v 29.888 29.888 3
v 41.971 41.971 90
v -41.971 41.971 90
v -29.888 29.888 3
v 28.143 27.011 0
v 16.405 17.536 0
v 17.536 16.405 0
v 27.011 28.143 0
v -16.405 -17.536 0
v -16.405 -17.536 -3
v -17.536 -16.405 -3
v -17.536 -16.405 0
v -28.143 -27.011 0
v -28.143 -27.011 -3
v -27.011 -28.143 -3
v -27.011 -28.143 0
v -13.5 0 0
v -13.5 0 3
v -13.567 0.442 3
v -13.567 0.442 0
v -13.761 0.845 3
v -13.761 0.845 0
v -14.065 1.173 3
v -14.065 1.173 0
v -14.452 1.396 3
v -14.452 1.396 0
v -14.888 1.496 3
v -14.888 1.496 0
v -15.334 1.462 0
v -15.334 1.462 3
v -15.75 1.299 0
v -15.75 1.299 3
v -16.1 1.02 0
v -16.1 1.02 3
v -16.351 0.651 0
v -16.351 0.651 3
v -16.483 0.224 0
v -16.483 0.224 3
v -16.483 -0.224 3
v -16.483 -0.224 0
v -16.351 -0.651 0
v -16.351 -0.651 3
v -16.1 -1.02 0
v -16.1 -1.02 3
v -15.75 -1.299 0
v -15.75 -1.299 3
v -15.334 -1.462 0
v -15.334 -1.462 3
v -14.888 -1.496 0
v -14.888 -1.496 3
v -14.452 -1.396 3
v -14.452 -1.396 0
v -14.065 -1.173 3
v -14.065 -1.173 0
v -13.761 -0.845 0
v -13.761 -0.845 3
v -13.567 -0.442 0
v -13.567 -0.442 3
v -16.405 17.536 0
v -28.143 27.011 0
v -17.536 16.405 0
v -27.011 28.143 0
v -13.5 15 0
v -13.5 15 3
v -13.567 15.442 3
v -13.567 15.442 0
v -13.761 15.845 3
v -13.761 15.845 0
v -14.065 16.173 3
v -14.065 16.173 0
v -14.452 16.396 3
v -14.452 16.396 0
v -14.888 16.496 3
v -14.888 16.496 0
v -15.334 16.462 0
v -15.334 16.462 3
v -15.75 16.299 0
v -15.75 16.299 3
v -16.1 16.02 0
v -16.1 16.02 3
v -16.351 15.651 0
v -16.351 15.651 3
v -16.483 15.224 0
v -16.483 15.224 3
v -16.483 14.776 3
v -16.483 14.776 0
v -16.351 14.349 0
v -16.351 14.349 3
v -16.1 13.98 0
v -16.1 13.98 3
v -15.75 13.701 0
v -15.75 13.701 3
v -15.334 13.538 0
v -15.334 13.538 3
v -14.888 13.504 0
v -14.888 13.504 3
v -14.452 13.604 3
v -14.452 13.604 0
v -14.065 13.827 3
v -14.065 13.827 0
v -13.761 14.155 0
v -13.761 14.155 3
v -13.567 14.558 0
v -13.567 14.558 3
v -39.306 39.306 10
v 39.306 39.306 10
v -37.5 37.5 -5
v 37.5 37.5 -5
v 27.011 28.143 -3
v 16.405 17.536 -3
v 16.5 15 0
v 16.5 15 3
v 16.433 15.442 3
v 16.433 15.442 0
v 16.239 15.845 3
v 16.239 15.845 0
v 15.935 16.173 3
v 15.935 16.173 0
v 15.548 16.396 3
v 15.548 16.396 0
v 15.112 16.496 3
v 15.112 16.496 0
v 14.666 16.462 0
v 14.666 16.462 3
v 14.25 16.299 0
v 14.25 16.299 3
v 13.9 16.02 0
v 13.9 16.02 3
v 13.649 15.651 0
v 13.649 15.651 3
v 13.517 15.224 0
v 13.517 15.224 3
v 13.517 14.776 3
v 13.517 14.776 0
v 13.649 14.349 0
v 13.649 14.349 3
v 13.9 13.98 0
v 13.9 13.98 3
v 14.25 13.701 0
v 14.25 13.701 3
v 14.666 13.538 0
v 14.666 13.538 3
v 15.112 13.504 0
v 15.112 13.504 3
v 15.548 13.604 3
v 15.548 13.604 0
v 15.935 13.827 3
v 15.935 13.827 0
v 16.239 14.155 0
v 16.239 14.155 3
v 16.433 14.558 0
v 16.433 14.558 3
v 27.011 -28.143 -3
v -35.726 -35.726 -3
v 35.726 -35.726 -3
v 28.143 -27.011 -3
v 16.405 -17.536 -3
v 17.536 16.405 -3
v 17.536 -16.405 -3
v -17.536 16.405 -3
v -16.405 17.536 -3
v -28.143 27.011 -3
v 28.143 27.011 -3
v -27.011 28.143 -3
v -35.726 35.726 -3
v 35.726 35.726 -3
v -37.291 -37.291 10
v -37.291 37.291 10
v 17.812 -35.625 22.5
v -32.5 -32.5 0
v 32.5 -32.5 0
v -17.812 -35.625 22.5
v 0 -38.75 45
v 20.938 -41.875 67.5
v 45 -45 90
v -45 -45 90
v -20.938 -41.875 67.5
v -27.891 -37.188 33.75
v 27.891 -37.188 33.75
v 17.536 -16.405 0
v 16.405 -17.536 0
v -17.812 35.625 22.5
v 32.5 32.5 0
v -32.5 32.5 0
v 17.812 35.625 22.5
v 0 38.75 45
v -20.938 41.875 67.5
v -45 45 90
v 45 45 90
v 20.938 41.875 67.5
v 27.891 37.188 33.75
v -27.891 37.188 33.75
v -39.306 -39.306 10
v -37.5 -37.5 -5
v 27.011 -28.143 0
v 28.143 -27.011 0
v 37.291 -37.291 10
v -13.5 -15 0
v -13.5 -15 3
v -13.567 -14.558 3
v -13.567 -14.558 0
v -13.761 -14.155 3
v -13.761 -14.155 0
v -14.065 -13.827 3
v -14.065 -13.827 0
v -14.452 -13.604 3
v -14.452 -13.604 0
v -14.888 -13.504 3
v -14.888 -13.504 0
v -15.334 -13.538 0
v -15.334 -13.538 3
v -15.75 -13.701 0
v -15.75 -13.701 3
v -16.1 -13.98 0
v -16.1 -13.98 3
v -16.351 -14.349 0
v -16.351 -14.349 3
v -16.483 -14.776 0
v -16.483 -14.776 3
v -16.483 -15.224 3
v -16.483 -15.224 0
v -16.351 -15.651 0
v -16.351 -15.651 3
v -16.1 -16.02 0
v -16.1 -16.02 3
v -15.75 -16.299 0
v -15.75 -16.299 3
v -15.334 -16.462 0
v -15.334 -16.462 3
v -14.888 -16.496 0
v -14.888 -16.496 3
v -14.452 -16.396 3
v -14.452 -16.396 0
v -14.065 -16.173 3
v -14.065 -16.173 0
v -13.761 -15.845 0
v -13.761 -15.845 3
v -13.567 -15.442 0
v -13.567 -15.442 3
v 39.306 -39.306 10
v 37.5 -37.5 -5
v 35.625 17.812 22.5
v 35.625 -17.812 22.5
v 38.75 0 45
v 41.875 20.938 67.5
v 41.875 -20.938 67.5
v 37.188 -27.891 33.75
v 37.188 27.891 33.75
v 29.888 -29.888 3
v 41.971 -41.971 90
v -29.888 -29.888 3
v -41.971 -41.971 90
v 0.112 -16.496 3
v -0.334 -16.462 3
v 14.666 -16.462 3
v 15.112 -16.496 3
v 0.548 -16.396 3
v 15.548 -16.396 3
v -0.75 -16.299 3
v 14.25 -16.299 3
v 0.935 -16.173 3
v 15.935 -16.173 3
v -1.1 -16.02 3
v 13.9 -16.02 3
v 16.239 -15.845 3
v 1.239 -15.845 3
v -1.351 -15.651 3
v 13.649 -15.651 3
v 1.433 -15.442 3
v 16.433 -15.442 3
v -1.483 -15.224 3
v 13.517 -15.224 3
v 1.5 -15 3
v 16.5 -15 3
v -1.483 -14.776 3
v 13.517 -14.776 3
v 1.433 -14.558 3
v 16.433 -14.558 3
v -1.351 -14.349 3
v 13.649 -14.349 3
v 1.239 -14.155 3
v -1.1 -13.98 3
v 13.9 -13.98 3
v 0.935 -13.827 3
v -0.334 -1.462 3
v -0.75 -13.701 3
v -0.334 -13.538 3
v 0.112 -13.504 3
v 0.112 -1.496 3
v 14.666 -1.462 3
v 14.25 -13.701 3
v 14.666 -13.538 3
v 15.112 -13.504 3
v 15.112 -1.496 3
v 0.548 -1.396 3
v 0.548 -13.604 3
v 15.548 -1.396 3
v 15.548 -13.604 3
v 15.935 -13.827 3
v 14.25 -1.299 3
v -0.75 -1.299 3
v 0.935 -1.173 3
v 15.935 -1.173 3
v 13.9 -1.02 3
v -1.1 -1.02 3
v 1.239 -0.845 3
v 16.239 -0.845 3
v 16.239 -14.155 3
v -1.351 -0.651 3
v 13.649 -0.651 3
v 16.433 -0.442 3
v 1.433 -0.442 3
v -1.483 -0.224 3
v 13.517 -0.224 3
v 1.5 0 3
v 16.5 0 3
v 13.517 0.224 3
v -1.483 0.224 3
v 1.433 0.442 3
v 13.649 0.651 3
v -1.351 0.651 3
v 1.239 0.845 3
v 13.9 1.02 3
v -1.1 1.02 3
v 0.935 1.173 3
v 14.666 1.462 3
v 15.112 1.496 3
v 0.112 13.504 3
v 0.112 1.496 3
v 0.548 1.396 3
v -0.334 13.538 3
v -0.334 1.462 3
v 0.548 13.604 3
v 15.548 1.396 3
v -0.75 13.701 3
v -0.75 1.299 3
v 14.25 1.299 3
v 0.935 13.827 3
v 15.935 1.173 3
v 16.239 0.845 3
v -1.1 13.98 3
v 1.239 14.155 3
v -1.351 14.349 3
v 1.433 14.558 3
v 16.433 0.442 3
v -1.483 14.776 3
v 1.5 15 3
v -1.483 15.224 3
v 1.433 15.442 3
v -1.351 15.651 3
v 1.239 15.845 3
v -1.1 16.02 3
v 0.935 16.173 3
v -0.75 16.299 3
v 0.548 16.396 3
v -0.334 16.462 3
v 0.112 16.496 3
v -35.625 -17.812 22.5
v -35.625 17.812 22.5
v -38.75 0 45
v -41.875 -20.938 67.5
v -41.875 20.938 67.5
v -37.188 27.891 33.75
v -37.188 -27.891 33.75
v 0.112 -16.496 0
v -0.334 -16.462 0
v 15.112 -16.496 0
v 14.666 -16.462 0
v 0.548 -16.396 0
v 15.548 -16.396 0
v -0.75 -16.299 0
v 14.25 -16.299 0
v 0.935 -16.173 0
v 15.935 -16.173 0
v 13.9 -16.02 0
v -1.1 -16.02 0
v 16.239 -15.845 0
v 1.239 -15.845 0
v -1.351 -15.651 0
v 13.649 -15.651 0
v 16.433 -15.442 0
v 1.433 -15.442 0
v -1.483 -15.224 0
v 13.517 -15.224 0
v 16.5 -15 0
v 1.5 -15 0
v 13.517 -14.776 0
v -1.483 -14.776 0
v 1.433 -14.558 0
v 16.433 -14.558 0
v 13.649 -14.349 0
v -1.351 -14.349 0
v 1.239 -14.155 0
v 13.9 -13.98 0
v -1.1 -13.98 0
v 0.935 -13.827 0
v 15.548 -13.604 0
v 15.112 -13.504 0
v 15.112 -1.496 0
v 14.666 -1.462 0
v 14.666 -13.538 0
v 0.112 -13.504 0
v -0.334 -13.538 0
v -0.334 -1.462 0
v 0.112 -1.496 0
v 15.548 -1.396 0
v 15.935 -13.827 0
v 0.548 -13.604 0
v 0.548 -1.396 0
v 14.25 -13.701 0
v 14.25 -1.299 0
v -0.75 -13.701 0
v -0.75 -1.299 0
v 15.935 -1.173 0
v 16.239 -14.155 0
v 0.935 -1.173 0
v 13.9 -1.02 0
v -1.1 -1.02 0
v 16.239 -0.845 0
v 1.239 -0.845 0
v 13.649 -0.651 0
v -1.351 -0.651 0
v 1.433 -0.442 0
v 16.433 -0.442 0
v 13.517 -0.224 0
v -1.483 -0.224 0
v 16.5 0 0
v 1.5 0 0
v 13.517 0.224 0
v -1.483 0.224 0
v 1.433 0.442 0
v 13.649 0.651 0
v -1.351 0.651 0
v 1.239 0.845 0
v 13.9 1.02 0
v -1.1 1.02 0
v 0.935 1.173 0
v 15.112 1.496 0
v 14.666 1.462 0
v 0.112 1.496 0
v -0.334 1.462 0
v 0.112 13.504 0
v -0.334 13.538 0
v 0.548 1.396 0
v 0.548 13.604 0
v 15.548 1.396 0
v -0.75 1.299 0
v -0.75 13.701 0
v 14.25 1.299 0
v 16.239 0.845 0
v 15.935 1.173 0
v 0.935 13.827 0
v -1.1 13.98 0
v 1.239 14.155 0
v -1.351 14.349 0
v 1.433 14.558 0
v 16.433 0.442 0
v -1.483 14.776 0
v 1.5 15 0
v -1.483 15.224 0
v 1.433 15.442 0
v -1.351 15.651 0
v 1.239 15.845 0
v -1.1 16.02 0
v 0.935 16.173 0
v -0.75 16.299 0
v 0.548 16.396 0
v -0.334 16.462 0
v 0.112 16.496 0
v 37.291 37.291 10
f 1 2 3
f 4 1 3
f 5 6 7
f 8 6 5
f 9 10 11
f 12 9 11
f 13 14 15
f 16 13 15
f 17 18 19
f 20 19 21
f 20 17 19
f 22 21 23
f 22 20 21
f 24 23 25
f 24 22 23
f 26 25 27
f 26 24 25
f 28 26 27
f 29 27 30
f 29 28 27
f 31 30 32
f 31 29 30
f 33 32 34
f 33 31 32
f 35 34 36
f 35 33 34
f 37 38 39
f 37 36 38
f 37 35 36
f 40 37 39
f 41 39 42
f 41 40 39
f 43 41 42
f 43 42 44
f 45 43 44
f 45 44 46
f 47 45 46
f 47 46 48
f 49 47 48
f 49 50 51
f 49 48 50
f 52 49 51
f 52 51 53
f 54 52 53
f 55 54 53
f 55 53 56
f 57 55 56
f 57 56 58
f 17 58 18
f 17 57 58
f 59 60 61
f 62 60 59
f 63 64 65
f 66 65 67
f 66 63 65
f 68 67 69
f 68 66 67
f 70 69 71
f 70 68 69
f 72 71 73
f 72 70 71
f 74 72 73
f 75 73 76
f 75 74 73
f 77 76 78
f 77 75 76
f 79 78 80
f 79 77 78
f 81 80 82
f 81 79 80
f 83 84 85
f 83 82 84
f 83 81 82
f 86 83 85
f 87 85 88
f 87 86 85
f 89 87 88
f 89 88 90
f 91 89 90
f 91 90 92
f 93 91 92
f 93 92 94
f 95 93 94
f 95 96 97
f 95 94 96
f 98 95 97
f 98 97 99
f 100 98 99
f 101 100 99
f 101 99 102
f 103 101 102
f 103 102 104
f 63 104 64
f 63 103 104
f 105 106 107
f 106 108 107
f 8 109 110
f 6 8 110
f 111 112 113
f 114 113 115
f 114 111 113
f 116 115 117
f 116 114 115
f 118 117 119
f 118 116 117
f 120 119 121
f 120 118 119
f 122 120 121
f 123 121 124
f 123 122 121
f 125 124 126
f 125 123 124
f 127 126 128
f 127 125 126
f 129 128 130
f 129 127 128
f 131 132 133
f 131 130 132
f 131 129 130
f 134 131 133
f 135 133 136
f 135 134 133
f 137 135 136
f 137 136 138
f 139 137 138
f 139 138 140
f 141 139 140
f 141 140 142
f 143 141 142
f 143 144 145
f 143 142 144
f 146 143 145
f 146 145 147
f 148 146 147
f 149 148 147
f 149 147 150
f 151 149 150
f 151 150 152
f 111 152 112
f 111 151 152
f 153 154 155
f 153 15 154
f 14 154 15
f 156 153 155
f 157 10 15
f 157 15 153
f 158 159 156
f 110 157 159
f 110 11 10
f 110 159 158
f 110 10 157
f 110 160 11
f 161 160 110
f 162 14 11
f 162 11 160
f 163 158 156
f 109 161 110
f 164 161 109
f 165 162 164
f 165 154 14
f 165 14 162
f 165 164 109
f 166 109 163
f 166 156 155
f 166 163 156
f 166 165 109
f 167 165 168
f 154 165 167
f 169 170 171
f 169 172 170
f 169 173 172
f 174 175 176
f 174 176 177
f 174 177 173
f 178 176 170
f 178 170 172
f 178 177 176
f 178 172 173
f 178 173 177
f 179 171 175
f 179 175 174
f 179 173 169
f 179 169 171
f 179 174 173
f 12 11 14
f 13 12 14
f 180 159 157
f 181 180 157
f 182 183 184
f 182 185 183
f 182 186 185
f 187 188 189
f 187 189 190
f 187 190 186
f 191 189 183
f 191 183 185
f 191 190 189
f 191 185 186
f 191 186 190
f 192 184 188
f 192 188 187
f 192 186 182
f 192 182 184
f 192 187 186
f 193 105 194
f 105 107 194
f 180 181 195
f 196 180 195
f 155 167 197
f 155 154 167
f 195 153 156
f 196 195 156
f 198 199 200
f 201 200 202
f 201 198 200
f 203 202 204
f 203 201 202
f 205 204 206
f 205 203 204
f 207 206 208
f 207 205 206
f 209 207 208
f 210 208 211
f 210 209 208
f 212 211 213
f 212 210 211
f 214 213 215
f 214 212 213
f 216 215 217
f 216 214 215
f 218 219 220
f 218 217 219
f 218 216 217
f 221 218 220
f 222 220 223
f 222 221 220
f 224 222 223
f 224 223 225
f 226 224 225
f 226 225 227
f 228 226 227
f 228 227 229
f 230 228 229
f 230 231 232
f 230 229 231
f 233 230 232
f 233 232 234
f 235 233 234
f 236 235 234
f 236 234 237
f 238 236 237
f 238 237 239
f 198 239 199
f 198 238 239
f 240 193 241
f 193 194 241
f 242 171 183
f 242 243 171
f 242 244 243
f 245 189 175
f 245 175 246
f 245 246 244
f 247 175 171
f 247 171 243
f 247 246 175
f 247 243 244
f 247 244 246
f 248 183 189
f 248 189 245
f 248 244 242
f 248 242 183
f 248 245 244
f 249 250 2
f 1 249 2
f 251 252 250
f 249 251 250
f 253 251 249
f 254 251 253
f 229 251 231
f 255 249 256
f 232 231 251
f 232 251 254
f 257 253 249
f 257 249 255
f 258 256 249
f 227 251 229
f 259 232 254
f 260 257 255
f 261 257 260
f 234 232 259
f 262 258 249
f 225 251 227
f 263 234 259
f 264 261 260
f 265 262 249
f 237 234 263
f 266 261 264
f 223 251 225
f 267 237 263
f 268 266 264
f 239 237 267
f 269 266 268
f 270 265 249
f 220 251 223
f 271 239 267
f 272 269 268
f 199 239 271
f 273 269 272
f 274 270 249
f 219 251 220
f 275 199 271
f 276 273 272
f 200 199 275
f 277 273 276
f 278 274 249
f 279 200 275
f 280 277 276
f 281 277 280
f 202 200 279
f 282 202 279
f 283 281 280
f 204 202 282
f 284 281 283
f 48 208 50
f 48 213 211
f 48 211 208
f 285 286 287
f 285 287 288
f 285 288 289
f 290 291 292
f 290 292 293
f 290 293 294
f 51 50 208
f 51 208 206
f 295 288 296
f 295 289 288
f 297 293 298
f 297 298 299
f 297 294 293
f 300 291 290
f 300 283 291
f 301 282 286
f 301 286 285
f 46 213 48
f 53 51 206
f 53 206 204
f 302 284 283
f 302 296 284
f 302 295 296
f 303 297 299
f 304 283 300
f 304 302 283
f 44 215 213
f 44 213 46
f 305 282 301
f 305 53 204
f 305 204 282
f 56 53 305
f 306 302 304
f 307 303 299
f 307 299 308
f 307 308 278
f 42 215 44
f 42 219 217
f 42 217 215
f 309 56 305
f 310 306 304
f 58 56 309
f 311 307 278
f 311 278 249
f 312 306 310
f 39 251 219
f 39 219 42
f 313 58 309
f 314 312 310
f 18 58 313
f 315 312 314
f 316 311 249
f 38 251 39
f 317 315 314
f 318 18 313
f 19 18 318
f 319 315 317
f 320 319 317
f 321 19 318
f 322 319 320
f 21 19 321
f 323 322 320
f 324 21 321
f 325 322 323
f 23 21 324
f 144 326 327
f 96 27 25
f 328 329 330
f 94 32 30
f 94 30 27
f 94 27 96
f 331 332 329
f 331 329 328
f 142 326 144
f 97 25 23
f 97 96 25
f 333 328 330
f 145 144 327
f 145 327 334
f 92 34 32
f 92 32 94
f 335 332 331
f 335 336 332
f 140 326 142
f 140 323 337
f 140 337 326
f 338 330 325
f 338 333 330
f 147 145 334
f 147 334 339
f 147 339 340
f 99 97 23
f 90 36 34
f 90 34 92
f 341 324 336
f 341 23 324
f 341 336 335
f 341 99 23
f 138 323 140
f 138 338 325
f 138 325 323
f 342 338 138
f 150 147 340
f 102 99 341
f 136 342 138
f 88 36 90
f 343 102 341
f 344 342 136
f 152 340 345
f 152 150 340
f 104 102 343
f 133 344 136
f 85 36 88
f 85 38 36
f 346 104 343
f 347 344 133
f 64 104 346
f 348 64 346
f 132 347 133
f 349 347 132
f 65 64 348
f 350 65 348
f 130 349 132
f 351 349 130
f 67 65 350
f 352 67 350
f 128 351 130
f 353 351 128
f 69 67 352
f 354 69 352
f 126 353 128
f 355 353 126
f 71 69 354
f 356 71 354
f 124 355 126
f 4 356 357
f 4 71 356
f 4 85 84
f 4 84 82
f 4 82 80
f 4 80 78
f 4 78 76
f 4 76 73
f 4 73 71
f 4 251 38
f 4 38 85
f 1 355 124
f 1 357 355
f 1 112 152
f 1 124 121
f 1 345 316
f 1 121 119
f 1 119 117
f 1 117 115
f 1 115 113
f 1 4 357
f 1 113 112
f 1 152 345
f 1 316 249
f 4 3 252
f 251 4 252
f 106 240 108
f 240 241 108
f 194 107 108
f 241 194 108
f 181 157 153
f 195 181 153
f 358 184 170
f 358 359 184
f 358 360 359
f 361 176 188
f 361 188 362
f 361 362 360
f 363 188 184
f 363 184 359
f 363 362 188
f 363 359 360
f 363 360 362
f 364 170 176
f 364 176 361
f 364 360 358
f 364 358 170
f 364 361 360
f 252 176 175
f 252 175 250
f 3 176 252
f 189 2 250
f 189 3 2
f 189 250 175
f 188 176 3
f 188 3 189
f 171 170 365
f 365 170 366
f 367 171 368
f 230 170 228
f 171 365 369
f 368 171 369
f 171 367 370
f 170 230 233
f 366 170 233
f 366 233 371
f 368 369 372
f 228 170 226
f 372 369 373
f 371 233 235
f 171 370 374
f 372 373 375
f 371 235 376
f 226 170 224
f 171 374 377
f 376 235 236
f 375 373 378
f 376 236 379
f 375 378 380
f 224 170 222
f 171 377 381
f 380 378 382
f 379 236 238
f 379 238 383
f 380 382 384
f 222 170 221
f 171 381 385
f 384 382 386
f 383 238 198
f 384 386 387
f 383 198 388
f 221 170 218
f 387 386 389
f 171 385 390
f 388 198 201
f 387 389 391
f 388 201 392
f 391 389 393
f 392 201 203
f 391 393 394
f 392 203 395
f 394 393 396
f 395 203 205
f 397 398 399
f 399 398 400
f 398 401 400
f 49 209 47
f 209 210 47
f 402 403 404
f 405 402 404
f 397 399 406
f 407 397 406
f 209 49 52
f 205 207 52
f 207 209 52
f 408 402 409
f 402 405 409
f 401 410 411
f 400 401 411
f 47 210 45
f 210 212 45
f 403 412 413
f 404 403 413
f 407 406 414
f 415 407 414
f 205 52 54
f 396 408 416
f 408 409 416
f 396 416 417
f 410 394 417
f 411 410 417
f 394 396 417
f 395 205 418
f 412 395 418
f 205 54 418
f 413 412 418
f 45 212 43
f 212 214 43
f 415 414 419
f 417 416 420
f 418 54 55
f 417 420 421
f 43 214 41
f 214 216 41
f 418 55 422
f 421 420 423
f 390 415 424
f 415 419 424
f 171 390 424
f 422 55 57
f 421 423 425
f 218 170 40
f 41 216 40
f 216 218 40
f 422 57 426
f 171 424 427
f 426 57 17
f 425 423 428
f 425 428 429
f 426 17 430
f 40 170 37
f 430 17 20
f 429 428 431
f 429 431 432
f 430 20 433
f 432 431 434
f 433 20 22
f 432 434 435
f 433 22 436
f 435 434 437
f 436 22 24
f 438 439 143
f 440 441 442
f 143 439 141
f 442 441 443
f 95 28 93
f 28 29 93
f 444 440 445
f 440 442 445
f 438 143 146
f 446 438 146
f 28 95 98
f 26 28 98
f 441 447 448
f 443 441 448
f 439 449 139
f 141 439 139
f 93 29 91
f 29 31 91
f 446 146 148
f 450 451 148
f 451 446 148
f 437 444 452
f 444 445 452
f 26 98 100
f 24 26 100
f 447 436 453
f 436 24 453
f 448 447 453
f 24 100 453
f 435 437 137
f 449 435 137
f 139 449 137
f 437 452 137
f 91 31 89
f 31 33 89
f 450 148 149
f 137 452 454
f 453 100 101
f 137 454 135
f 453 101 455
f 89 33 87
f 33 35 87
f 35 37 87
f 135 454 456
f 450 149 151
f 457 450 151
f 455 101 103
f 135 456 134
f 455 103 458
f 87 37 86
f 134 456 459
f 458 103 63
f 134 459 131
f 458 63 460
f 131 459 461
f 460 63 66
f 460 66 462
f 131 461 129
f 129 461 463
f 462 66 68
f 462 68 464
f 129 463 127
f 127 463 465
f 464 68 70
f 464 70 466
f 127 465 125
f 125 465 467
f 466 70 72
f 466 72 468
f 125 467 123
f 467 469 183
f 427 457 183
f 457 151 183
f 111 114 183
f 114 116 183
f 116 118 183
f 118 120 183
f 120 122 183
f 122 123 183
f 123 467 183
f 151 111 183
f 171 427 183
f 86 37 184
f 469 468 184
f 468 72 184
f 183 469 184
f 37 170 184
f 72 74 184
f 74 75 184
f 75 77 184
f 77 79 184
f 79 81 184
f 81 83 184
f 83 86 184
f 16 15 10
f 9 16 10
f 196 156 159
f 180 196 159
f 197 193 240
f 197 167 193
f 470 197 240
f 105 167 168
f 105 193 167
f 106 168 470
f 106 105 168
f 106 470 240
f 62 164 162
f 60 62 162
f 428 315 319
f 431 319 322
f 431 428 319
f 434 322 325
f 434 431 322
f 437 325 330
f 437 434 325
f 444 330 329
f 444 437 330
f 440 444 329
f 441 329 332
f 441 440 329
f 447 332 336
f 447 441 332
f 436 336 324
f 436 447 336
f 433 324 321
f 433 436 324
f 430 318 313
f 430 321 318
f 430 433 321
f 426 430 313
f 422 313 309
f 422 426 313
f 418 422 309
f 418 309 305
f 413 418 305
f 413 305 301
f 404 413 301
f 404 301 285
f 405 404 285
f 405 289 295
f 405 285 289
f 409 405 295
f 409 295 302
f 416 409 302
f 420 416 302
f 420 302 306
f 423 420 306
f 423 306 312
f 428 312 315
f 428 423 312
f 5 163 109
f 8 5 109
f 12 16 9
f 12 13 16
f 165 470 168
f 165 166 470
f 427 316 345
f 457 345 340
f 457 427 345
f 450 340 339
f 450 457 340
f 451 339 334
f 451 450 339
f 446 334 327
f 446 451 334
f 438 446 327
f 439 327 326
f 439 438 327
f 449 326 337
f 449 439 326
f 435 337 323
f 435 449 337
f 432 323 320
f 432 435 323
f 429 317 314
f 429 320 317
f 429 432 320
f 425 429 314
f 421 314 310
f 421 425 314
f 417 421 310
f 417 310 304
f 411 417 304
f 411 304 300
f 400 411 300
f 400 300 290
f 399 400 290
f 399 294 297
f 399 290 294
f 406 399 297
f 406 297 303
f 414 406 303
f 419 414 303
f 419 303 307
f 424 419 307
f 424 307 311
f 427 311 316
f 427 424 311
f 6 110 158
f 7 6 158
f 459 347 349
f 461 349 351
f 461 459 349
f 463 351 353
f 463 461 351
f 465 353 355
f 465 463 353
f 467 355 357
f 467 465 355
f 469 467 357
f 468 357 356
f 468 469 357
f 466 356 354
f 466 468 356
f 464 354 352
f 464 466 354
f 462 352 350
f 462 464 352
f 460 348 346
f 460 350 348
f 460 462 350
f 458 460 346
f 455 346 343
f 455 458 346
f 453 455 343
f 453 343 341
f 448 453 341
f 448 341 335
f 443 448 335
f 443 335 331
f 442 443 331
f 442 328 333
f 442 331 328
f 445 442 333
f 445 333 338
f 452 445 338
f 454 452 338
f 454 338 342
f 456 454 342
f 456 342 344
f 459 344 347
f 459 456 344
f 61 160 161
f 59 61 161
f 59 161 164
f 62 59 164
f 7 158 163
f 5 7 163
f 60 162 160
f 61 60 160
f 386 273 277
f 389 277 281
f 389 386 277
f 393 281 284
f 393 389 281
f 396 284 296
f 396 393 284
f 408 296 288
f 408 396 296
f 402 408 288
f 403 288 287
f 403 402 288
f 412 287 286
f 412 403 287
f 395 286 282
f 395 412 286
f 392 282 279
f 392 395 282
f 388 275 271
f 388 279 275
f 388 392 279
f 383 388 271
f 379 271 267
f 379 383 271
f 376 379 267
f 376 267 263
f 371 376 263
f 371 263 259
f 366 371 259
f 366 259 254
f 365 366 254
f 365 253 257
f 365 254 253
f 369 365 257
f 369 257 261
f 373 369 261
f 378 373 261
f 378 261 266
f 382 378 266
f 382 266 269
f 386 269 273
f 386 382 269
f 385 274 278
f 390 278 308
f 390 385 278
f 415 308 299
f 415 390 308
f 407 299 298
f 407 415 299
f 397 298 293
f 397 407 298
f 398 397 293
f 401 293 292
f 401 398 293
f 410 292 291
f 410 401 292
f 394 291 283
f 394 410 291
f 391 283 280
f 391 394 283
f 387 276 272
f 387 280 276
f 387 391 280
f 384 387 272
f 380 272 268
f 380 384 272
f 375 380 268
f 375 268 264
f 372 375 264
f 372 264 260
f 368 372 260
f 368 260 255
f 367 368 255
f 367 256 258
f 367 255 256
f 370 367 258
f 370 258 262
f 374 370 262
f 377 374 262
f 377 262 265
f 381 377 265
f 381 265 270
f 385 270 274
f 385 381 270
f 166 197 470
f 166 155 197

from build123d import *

# Parameters (mm, degrees)
F0_W      = 65
F0_H      = 65
F2_W      = 90
F2_H      = 90
F4_T      = -3
F5_R      = 1.5
F6_DEPTH  = 90.0010001
F10_W     = 78.6111111111
F10_H     = 78.6111111111
F8_W      = 75
F8_H      = 75
F12_T     = -2
F14_DEPTH = 3


with BuildPart() as f3:
    # F0 (on Top) → F3 section 0
    with BuildSketch(Plane.XY):
        Rectangle(F0_W, F0_H)
    # F2 (on offset) → F3 section 1
    with BuildSketch(Plane.XY.offset(90)):
        Rectangle(F2_W, F2_H)
    loft()

    # F4
    f4_openings = [f3.faces().sort_by_distance(p)[0] for p in [
        (0, 0, 90),
    ]]
    offset(amount=F4_T, openings=f4_openings)

    # F5 (on Top) → F6 (cut, through all)
    with BuildSketch(Plane.XY):
        with Locations((-15, -15)):
            Circle(F5_R)
        with Locations((-15, 0)):
            Circle(F5_R)
        with Locations((-15, 15)):
            Circle(F5_R)
        with Locations((0, -15)):
            Circle(F5_R)
        Circle(F5_R)
        with Locations((0, 15)):
            Circle(F5_R)
        with Locations((15, -15)):
            Circle(F5_R)
        with Locations((15, 0)):
            Circle(F5_R)
        with Locations((15, 15)):
            Circle(F5_R)
    extrude(amount=F6_DEPTH, mode=Mode.SUBTRACT)


with BuildPart() as f11:
    # F10 (on offset) → F11 section 0
    with BuildSketch(Plane.XY.offset(10)):
        Rectangle(F10_W, F10_H)
    # F8 (on offset) → F11 section 1
    with BuildSketch(Plane.XY.offset(-5)):
        Rectangle(F8_W, F8_H)
    loft()

    # F12
    f12_openings = [f11.faces().sort_by_distance(p)[0] for p in [
        (0, 0, 10),
    ]]
    offset(amount=F12_T, openings=f12_openings)

    # F13 (on face) → F14 (join)
    with BuildSketch(Plane.XY.offset(-3)):
        Polygon((-27.0114790413, -28.1428498912), (-16.4048773235, -17.5362481734), (-17.5362481734, -16.4048773235), (-28.1428498912, -27.0114790413), align=None)
        Polygon((27.0114790413, -28.1428498912), (28.1428498912, -27.0114790413), (17.5362481734, -16.4048773235), (16.4048773235, -17.5362481734), align=None)
        Polygon((28.1428498912, 27.0114790413), (27.0114790413, 28.1428498912), (16.4048773235, 17.5362481734), (17.5362481734, 16.4048773235), align=None)
        Polygon((-27.0114790413, 28.1428498912), (-28.1428498912, 27.0114790413), (-17.5362481734, 16.4048773235), (-16.4048773235, 17.5362481734), align=None)
    extrude(amount=F14_DEPTH)


solid = Compound([f3.part, f11.part])
